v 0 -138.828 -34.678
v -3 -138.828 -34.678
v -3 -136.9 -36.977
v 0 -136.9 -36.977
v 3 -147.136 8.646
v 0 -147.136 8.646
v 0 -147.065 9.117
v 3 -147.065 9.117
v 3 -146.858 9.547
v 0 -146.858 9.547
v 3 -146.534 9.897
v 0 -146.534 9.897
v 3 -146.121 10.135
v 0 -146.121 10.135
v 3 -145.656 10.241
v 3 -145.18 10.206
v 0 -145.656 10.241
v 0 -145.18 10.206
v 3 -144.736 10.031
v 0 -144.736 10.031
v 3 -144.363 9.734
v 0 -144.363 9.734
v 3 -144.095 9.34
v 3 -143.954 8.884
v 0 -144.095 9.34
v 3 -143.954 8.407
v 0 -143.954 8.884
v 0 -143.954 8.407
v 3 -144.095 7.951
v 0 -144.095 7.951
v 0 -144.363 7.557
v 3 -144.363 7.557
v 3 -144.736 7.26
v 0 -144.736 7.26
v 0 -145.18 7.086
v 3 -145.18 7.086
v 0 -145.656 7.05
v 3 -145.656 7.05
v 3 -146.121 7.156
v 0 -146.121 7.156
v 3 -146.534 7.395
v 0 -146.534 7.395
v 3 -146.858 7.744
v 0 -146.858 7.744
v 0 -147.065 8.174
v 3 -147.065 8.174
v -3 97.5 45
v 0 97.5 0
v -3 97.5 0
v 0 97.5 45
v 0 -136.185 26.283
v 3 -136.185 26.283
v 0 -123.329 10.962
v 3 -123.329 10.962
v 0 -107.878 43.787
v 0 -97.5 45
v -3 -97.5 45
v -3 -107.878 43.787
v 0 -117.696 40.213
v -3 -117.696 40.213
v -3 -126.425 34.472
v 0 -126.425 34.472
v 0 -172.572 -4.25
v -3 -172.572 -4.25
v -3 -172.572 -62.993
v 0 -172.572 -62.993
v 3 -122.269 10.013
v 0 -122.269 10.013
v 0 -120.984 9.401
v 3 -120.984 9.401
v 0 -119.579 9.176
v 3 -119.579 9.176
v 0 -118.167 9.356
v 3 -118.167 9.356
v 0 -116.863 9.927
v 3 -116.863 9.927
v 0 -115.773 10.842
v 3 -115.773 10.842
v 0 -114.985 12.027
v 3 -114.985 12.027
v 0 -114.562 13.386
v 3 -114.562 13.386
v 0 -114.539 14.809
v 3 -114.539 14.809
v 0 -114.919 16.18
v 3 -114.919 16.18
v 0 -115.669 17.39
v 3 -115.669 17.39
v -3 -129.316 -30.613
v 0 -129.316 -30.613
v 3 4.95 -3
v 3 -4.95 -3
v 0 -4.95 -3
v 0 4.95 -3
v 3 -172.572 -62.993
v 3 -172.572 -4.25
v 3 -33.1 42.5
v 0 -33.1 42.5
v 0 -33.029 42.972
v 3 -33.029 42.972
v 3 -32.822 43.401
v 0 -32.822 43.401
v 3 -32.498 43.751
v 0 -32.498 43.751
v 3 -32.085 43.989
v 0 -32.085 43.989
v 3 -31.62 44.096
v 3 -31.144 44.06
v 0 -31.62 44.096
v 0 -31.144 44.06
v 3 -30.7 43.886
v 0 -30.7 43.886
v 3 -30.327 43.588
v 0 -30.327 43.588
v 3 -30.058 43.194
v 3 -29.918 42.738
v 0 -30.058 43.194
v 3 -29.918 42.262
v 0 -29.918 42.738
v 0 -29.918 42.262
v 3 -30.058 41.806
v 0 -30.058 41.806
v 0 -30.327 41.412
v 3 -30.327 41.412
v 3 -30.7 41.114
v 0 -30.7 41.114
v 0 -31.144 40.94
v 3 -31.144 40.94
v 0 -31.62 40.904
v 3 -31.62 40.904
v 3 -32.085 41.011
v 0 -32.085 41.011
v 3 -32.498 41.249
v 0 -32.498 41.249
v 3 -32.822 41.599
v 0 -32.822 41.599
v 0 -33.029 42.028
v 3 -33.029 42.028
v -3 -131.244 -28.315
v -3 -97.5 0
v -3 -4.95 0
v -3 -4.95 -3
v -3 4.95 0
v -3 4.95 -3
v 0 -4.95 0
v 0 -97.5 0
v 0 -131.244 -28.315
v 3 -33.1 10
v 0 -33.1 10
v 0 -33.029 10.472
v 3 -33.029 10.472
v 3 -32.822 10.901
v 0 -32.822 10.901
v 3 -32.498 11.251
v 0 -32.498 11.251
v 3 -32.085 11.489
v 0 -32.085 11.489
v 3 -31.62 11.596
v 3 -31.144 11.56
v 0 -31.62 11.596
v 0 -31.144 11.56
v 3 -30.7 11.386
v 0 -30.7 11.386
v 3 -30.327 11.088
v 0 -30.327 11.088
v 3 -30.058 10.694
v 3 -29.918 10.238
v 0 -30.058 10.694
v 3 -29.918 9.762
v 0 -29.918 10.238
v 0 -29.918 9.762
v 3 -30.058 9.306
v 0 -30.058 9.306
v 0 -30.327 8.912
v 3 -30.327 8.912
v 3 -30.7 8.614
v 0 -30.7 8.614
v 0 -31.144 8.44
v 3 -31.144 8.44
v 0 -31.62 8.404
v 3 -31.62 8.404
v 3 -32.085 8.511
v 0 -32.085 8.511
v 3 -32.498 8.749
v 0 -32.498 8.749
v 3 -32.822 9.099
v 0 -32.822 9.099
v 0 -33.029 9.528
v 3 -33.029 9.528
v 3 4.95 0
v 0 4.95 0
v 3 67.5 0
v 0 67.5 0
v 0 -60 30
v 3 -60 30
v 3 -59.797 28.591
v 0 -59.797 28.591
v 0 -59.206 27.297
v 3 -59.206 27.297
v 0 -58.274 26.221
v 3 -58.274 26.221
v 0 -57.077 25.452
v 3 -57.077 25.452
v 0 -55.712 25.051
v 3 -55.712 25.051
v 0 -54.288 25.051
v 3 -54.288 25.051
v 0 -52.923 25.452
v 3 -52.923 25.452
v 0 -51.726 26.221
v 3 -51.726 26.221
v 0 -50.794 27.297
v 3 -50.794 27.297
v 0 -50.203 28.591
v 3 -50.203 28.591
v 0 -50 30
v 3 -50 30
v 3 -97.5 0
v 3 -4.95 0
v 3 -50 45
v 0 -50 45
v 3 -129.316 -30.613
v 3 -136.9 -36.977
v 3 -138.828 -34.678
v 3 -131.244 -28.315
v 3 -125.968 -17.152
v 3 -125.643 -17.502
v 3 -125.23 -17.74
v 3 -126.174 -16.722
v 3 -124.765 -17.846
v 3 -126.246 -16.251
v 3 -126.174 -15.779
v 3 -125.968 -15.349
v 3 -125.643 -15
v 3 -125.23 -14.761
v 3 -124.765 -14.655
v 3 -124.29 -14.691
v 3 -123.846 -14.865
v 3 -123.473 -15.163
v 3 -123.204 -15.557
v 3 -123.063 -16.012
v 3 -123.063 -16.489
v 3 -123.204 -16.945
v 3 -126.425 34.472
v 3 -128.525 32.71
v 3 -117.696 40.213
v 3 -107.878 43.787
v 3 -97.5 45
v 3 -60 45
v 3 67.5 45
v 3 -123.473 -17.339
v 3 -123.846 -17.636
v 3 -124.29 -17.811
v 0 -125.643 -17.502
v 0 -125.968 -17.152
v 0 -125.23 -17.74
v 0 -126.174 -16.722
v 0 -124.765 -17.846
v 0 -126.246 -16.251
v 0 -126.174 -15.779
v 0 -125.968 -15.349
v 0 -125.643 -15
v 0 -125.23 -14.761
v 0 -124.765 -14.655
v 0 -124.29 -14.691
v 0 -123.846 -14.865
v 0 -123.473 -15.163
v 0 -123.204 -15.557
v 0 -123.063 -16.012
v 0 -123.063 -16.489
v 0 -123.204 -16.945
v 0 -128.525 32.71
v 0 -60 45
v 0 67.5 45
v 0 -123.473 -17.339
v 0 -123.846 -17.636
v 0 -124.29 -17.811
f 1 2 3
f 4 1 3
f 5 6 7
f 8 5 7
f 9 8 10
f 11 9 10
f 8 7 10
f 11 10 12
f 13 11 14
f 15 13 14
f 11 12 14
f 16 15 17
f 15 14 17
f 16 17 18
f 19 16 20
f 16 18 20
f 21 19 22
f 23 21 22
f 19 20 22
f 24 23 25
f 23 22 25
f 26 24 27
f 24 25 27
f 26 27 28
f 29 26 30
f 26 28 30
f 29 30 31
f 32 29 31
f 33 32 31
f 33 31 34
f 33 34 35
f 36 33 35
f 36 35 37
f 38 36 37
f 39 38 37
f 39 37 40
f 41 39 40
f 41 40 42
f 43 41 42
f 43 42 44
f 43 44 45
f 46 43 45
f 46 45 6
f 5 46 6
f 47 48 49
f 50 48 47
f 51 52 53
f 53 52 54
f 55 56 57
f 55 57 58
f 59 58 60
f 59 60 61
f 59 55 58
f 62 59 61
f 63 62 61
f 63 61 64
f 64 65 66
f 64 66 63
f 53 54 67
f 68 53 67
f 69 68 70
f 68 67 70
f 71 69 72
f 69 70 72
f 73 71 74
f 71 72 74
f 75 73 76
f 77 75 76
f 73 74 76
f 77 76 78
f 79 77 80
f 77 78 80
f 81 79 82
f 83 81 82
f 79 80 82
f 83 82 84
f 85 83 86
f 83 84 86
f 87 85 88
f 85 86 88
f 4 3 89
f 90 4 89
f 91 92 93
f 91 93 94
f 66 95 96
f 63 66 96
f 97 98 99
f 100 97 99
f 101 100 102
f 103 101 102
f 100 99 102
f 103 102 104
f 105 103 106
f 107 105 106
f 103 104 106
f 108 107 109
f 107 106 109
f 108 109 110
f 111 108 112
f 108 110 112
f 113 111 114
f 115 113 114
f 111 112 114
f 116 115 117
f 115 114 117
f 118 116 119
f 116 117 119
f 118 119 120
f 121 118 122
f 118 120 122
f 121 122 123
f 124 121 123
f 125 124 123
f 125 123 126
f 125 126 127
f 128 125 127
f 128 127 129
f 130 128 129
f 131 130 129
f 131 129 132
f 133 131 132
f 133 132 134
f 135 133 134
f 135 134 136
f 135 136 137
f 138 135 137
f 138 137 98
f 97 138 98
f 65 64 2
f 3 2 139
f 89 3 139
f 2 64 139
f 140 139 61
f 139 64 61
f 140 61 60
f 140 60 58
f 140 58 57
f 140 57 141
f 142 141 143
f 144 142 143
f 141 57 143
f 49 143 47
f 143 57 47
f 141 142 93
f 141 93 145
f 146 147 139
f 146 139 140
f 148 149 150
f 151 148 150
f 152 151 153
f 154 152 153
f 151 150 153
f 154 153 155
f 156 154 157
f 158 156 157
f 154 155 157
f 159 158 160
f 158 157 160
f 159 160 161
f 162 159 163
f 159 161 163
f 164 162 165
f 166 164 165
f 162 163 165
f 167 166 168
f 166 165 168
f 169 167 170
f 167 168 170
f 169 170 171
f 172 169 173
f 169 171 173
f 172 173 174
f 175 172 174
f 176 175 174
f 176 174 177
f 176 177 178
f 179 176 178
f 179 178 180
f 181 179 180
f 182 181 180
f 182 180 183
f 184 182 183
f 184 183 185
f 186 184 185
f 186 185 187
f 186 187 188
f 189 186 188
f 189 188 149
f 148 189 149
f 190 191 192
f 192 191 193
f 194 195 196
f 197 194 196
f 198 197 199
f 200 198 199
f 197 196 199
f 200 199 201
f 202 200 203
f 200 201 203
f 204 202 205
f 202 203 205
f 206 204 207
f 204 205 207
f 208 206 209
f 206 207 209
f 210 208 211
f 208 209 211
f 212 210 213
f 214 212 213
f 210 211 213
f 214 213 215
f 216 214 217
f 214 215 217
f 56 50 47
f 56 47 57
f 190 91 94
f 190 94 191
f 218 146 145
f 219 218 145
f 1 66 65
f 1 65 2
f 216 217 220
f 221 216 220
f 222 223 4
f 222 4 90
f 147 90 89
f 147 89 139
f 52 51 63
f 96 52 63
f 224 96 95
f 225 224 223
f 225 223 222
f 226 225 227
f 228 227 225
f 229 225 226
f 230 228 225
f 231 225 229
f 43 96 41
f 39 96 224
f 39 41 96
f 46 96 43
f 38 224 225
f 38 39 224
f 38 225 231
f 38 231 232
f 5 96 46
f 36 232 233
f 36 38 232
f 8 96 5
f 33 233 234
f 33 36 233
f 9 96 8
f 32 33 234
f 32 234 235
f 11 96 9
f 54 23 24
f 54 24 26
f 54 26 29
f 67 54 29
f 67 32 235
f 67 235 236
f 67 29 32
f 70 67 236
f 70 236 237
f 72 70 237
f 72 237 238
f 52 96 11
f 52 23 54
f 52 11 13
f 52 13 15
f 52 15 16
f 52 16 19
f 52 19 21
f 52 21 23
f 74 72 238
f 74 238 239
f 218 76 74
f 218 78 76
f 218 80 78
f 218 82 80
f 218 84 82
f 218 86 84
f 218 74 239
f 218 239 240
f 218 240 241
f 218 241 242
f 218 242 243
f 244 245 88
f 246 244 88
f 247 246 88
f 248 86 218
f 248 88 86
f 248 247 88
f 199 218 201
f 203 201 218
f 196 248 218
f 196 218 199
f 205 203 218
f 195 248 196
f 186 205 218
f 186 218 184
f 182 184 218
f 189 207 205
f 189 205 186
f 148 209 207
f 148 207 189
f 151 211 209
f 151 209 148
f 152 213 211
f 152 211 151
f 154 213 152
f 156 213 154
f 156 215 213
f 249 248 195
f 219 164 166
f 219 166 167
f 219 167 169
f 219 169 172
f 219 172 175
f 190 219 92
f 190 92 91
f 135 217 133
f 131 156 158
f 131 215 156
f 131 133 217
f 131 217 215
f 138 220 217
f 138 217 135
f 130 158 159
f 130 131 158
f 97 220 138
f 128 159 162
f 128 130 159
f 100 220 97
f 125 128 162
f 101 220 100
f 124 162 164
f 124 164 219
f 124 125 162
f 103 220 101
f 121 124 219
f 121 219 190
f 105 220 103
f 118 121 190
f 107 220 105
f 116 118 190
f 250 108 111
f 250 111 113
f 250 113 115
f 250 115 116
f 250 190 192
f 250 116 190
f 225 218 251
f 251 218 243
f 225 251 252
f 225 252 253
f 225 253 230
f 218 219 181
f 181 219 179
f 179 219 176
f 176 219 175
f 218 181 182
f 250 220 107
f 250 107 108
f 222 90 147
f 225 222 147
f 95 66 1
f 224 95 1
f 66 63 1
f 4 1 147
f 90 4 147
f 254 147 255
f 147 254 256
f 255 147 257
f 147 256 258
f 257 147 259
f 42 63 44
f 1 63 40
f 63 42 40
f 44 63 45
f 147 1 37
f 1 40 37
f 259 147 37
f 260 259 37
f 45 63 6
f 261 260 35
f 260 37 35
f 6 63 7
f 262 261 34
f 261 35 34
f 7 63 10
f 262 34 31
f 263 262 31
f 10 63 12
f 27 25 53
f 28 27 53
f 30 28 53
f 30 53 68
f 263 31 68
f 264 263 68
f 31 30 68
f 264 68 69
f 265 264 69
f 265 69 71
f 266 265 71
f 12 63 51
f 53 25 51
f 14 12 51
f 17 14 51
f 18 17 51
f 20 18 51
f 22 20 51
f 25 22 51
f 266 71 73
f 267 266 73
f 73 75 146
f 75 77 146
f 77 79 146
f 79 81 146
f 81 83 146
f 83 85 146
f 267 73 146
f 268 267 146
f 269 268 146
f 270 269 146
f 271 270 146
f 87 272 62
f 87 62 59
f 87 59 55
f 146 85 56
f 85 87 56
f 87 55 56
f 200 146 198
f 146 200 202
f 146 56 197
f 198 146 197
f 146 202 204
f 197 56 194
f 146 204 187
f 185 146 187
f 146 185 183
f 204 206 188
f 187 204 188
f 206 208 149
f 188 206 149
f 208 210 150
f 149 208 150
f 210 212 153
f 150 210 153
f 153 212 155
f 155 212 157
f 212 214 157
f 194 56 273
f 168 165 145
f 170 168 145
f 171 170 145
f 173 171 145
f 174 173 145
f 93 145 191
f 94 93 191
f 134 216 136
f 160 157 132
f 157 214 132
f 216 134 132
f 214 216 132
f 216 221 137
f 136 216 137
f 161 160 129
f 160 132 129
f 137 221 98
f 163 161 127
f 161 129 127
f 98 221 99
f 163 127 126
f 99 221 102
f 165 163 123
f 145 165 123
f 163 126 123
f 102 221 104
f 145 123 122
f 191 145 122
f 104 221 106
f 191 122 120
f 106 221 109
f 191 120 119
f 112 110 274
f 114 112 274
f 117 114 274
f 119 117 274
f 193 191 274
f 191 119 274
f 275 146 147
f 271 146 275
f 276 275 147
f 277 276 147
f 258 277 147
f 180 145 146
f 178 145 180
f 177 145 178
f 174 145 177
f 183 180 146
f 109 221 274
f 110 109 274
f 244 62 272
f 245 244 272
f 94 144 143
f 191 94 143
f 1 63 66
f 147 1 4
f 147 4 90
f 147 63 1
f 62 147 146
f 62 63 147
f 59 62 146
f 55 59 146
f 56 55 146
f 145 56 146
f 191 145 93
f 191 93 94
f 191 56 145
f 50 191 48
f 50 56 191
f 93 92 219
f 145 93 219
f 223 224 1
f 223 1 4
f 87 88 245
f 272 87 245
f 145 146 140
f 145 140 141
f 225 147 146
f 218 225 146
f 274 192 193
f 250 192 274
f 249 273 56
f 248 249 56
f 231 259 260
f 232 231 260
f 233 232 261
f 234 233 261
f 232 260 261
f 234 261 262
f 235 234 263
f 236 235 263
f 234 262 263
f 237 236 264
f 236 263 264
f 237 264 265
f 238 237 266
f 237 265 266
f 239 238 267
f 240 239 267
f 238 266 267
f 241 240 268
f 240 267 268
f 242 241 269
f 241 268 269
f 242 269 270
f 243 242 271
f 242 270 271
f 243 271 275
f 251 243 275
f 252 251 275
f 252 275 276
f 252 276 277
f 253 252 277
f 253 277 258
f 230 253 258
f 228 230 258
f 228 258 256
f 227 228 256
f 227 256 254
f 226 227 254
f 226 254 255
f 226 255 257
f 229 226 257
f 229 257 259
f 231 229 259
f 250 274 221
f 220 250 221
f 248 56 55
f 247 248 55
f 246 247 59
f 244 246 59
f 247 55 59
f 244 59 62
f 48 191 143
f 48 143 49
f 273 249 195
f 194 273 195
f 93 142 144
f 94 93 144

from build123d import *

# Parameters (mm, degrees)
F1_DEPTH  = 3
F2_W      = 9.9
F2_H      = 3
F3_DEPTH  = 3
F5_DEPTH  = 3
F7_W      = 30
F7_H      = 45
F8_DEPTH  = 3
F10_D     = 3.2
F10_DEPTH = 4
F10_TIP   = 0.9613769904
F12_DEPTH = 3
F14_D     = 3.2
F14_DEPTH = 4
F14_TIP   = 0.9613769904
F15_DEPTH = 3


with BuildPart() as f1:
    # F0 (on Right) → F1 (new body)
    with BuildSketch(Plane.YZ):
        with BuildLine():
            Line((-172.5723554257, -62.9931857493), (-97.5, 0))
            Line((-97.5, 0), (97.5, 0))
            Line((97.5, 0), (97.5, 45))
            Line((97.5, 45), (-97.5, 45))
            ThreePointArc((-97.5, 45), (-112.8909064497, 42.2861679354), (-126.4254424359, 34.4719999404))
            Line((-126.4254424359, 34.4719999404), (-201.4977978616, -28.5211858089))
            Line((-201.4977978616, -28.5211858089), (-172.5723554257, -62.9931857493))
        make_face()
    extrude(amount=F1_DEPTH)

    # F2 (on face) → F3 (join, through all)
    with BuildSketch(Plane.YZ.offset(3)):
        with Locations((0, -1.5)):
            Rectangle(F2_W, F2_H)
        Polygon((-129.3158948903, -30.612927536), (-131.2442577194, -28.3147942067), (-138.8280977063, -34.6783915426), (-136.8997348772, -36.9765248719), align=None)
    extrude(amount=-F3_DEPTH)

    # F4 (on face) → F5 (cut, through all)
    with BuildSketch(Plane.YZ.offset(3)):
        Polygon((-201.4977978616, -28.5211858089), (-172.5723554257, -62.9931857493), (-172.5723554257, -4.2498577293), align=None)
    extrude(amount=-F5_DEPTH, mode=Mode.SUBTRACT)


with BuildPart() as f6_1:
    # F6: instance of F1
    add(f1.part.mirror(Plane.YZ))


with BuildPart() as f1_1:
    add(f1.part)

    # F7 (on face) → F8 (cut, through all)
    with BuildSketch(Plane.YZ.offset(3)):
        with Locations((82.5, 22.5)):
            Rectangle(F7_W, F7_H)
    extrude(amount=-F8_DEPTH, mode=Mode.SUBTRACT)

    # F10
    with Locations(Plane.YZ.offset(3)):
        with Locations((-124.6455621877, -16.2507947732), (-145.5361595026, 8.6456496282)):
            Hole(F10_D / 2, depth=F10_DEPTH)
            with Locations((0, 0, -(F10_DEPTH + F10_TIP / 2))):  # 118° drill point
                Cone(0, F10_D / 2, F10_TIP, mode=Mode.SUBTRACT)

    # F11 (on face) → F12 (cut, through all)
    with BuildSketch(Plane.YZ.offset(3)):
        with BuildLine():
            Line((-128.5247999463, 32.7104298276), (-136.1852443775, 26.2825537308))
            Line((-136.1852443775, 26.2825537308), (-123.3294921838, 10.9616648684))
            ThreePointArc((-123.3294921838, 10.9616648684), (-116.2853319197, 10.3453807012), (-115.6690477526, 17.3895409653))
            Line((-115.6690477526, 17.3895409653), (-128.5247999463, 32.7104298276))
        make_face()
    extrude(amount=-F12_DEPTH, mode=Mode.SUBTRACT)

    # F14
    with Locations(Plane.YZ.offset(3)):
        with Locations((-31.5, 42.5), (-31.5, 10)):
            Hole(F14_D / 2, depth=F14_DEPTH)
            with Locations((0, 0, -(F14_DEPTH + F14_TIP / 2))):  # 118° drill point
                Cone(0, F14_D / 2, F14_TIP, mode=Mode.SUBTRACT)

    # F13 (on face) → F15 (cut, through all)
    with BuildSketch(Plane.YZ.offset(3)):
        with BuildLine():
            Line((-50, 45), (-60, 45))
            Line((-60, 45), (-60, 30))
            ThreePointArc((-60, 30), (-55, 25), (-50, 30))
            Line((-50, 30), (-50, 45))
        make_face()
    extrude(amount=-F15_DEPTH, mode=Mode.SUBTRACT)


solid = Compound([f6_1.part, f1_1.part])
